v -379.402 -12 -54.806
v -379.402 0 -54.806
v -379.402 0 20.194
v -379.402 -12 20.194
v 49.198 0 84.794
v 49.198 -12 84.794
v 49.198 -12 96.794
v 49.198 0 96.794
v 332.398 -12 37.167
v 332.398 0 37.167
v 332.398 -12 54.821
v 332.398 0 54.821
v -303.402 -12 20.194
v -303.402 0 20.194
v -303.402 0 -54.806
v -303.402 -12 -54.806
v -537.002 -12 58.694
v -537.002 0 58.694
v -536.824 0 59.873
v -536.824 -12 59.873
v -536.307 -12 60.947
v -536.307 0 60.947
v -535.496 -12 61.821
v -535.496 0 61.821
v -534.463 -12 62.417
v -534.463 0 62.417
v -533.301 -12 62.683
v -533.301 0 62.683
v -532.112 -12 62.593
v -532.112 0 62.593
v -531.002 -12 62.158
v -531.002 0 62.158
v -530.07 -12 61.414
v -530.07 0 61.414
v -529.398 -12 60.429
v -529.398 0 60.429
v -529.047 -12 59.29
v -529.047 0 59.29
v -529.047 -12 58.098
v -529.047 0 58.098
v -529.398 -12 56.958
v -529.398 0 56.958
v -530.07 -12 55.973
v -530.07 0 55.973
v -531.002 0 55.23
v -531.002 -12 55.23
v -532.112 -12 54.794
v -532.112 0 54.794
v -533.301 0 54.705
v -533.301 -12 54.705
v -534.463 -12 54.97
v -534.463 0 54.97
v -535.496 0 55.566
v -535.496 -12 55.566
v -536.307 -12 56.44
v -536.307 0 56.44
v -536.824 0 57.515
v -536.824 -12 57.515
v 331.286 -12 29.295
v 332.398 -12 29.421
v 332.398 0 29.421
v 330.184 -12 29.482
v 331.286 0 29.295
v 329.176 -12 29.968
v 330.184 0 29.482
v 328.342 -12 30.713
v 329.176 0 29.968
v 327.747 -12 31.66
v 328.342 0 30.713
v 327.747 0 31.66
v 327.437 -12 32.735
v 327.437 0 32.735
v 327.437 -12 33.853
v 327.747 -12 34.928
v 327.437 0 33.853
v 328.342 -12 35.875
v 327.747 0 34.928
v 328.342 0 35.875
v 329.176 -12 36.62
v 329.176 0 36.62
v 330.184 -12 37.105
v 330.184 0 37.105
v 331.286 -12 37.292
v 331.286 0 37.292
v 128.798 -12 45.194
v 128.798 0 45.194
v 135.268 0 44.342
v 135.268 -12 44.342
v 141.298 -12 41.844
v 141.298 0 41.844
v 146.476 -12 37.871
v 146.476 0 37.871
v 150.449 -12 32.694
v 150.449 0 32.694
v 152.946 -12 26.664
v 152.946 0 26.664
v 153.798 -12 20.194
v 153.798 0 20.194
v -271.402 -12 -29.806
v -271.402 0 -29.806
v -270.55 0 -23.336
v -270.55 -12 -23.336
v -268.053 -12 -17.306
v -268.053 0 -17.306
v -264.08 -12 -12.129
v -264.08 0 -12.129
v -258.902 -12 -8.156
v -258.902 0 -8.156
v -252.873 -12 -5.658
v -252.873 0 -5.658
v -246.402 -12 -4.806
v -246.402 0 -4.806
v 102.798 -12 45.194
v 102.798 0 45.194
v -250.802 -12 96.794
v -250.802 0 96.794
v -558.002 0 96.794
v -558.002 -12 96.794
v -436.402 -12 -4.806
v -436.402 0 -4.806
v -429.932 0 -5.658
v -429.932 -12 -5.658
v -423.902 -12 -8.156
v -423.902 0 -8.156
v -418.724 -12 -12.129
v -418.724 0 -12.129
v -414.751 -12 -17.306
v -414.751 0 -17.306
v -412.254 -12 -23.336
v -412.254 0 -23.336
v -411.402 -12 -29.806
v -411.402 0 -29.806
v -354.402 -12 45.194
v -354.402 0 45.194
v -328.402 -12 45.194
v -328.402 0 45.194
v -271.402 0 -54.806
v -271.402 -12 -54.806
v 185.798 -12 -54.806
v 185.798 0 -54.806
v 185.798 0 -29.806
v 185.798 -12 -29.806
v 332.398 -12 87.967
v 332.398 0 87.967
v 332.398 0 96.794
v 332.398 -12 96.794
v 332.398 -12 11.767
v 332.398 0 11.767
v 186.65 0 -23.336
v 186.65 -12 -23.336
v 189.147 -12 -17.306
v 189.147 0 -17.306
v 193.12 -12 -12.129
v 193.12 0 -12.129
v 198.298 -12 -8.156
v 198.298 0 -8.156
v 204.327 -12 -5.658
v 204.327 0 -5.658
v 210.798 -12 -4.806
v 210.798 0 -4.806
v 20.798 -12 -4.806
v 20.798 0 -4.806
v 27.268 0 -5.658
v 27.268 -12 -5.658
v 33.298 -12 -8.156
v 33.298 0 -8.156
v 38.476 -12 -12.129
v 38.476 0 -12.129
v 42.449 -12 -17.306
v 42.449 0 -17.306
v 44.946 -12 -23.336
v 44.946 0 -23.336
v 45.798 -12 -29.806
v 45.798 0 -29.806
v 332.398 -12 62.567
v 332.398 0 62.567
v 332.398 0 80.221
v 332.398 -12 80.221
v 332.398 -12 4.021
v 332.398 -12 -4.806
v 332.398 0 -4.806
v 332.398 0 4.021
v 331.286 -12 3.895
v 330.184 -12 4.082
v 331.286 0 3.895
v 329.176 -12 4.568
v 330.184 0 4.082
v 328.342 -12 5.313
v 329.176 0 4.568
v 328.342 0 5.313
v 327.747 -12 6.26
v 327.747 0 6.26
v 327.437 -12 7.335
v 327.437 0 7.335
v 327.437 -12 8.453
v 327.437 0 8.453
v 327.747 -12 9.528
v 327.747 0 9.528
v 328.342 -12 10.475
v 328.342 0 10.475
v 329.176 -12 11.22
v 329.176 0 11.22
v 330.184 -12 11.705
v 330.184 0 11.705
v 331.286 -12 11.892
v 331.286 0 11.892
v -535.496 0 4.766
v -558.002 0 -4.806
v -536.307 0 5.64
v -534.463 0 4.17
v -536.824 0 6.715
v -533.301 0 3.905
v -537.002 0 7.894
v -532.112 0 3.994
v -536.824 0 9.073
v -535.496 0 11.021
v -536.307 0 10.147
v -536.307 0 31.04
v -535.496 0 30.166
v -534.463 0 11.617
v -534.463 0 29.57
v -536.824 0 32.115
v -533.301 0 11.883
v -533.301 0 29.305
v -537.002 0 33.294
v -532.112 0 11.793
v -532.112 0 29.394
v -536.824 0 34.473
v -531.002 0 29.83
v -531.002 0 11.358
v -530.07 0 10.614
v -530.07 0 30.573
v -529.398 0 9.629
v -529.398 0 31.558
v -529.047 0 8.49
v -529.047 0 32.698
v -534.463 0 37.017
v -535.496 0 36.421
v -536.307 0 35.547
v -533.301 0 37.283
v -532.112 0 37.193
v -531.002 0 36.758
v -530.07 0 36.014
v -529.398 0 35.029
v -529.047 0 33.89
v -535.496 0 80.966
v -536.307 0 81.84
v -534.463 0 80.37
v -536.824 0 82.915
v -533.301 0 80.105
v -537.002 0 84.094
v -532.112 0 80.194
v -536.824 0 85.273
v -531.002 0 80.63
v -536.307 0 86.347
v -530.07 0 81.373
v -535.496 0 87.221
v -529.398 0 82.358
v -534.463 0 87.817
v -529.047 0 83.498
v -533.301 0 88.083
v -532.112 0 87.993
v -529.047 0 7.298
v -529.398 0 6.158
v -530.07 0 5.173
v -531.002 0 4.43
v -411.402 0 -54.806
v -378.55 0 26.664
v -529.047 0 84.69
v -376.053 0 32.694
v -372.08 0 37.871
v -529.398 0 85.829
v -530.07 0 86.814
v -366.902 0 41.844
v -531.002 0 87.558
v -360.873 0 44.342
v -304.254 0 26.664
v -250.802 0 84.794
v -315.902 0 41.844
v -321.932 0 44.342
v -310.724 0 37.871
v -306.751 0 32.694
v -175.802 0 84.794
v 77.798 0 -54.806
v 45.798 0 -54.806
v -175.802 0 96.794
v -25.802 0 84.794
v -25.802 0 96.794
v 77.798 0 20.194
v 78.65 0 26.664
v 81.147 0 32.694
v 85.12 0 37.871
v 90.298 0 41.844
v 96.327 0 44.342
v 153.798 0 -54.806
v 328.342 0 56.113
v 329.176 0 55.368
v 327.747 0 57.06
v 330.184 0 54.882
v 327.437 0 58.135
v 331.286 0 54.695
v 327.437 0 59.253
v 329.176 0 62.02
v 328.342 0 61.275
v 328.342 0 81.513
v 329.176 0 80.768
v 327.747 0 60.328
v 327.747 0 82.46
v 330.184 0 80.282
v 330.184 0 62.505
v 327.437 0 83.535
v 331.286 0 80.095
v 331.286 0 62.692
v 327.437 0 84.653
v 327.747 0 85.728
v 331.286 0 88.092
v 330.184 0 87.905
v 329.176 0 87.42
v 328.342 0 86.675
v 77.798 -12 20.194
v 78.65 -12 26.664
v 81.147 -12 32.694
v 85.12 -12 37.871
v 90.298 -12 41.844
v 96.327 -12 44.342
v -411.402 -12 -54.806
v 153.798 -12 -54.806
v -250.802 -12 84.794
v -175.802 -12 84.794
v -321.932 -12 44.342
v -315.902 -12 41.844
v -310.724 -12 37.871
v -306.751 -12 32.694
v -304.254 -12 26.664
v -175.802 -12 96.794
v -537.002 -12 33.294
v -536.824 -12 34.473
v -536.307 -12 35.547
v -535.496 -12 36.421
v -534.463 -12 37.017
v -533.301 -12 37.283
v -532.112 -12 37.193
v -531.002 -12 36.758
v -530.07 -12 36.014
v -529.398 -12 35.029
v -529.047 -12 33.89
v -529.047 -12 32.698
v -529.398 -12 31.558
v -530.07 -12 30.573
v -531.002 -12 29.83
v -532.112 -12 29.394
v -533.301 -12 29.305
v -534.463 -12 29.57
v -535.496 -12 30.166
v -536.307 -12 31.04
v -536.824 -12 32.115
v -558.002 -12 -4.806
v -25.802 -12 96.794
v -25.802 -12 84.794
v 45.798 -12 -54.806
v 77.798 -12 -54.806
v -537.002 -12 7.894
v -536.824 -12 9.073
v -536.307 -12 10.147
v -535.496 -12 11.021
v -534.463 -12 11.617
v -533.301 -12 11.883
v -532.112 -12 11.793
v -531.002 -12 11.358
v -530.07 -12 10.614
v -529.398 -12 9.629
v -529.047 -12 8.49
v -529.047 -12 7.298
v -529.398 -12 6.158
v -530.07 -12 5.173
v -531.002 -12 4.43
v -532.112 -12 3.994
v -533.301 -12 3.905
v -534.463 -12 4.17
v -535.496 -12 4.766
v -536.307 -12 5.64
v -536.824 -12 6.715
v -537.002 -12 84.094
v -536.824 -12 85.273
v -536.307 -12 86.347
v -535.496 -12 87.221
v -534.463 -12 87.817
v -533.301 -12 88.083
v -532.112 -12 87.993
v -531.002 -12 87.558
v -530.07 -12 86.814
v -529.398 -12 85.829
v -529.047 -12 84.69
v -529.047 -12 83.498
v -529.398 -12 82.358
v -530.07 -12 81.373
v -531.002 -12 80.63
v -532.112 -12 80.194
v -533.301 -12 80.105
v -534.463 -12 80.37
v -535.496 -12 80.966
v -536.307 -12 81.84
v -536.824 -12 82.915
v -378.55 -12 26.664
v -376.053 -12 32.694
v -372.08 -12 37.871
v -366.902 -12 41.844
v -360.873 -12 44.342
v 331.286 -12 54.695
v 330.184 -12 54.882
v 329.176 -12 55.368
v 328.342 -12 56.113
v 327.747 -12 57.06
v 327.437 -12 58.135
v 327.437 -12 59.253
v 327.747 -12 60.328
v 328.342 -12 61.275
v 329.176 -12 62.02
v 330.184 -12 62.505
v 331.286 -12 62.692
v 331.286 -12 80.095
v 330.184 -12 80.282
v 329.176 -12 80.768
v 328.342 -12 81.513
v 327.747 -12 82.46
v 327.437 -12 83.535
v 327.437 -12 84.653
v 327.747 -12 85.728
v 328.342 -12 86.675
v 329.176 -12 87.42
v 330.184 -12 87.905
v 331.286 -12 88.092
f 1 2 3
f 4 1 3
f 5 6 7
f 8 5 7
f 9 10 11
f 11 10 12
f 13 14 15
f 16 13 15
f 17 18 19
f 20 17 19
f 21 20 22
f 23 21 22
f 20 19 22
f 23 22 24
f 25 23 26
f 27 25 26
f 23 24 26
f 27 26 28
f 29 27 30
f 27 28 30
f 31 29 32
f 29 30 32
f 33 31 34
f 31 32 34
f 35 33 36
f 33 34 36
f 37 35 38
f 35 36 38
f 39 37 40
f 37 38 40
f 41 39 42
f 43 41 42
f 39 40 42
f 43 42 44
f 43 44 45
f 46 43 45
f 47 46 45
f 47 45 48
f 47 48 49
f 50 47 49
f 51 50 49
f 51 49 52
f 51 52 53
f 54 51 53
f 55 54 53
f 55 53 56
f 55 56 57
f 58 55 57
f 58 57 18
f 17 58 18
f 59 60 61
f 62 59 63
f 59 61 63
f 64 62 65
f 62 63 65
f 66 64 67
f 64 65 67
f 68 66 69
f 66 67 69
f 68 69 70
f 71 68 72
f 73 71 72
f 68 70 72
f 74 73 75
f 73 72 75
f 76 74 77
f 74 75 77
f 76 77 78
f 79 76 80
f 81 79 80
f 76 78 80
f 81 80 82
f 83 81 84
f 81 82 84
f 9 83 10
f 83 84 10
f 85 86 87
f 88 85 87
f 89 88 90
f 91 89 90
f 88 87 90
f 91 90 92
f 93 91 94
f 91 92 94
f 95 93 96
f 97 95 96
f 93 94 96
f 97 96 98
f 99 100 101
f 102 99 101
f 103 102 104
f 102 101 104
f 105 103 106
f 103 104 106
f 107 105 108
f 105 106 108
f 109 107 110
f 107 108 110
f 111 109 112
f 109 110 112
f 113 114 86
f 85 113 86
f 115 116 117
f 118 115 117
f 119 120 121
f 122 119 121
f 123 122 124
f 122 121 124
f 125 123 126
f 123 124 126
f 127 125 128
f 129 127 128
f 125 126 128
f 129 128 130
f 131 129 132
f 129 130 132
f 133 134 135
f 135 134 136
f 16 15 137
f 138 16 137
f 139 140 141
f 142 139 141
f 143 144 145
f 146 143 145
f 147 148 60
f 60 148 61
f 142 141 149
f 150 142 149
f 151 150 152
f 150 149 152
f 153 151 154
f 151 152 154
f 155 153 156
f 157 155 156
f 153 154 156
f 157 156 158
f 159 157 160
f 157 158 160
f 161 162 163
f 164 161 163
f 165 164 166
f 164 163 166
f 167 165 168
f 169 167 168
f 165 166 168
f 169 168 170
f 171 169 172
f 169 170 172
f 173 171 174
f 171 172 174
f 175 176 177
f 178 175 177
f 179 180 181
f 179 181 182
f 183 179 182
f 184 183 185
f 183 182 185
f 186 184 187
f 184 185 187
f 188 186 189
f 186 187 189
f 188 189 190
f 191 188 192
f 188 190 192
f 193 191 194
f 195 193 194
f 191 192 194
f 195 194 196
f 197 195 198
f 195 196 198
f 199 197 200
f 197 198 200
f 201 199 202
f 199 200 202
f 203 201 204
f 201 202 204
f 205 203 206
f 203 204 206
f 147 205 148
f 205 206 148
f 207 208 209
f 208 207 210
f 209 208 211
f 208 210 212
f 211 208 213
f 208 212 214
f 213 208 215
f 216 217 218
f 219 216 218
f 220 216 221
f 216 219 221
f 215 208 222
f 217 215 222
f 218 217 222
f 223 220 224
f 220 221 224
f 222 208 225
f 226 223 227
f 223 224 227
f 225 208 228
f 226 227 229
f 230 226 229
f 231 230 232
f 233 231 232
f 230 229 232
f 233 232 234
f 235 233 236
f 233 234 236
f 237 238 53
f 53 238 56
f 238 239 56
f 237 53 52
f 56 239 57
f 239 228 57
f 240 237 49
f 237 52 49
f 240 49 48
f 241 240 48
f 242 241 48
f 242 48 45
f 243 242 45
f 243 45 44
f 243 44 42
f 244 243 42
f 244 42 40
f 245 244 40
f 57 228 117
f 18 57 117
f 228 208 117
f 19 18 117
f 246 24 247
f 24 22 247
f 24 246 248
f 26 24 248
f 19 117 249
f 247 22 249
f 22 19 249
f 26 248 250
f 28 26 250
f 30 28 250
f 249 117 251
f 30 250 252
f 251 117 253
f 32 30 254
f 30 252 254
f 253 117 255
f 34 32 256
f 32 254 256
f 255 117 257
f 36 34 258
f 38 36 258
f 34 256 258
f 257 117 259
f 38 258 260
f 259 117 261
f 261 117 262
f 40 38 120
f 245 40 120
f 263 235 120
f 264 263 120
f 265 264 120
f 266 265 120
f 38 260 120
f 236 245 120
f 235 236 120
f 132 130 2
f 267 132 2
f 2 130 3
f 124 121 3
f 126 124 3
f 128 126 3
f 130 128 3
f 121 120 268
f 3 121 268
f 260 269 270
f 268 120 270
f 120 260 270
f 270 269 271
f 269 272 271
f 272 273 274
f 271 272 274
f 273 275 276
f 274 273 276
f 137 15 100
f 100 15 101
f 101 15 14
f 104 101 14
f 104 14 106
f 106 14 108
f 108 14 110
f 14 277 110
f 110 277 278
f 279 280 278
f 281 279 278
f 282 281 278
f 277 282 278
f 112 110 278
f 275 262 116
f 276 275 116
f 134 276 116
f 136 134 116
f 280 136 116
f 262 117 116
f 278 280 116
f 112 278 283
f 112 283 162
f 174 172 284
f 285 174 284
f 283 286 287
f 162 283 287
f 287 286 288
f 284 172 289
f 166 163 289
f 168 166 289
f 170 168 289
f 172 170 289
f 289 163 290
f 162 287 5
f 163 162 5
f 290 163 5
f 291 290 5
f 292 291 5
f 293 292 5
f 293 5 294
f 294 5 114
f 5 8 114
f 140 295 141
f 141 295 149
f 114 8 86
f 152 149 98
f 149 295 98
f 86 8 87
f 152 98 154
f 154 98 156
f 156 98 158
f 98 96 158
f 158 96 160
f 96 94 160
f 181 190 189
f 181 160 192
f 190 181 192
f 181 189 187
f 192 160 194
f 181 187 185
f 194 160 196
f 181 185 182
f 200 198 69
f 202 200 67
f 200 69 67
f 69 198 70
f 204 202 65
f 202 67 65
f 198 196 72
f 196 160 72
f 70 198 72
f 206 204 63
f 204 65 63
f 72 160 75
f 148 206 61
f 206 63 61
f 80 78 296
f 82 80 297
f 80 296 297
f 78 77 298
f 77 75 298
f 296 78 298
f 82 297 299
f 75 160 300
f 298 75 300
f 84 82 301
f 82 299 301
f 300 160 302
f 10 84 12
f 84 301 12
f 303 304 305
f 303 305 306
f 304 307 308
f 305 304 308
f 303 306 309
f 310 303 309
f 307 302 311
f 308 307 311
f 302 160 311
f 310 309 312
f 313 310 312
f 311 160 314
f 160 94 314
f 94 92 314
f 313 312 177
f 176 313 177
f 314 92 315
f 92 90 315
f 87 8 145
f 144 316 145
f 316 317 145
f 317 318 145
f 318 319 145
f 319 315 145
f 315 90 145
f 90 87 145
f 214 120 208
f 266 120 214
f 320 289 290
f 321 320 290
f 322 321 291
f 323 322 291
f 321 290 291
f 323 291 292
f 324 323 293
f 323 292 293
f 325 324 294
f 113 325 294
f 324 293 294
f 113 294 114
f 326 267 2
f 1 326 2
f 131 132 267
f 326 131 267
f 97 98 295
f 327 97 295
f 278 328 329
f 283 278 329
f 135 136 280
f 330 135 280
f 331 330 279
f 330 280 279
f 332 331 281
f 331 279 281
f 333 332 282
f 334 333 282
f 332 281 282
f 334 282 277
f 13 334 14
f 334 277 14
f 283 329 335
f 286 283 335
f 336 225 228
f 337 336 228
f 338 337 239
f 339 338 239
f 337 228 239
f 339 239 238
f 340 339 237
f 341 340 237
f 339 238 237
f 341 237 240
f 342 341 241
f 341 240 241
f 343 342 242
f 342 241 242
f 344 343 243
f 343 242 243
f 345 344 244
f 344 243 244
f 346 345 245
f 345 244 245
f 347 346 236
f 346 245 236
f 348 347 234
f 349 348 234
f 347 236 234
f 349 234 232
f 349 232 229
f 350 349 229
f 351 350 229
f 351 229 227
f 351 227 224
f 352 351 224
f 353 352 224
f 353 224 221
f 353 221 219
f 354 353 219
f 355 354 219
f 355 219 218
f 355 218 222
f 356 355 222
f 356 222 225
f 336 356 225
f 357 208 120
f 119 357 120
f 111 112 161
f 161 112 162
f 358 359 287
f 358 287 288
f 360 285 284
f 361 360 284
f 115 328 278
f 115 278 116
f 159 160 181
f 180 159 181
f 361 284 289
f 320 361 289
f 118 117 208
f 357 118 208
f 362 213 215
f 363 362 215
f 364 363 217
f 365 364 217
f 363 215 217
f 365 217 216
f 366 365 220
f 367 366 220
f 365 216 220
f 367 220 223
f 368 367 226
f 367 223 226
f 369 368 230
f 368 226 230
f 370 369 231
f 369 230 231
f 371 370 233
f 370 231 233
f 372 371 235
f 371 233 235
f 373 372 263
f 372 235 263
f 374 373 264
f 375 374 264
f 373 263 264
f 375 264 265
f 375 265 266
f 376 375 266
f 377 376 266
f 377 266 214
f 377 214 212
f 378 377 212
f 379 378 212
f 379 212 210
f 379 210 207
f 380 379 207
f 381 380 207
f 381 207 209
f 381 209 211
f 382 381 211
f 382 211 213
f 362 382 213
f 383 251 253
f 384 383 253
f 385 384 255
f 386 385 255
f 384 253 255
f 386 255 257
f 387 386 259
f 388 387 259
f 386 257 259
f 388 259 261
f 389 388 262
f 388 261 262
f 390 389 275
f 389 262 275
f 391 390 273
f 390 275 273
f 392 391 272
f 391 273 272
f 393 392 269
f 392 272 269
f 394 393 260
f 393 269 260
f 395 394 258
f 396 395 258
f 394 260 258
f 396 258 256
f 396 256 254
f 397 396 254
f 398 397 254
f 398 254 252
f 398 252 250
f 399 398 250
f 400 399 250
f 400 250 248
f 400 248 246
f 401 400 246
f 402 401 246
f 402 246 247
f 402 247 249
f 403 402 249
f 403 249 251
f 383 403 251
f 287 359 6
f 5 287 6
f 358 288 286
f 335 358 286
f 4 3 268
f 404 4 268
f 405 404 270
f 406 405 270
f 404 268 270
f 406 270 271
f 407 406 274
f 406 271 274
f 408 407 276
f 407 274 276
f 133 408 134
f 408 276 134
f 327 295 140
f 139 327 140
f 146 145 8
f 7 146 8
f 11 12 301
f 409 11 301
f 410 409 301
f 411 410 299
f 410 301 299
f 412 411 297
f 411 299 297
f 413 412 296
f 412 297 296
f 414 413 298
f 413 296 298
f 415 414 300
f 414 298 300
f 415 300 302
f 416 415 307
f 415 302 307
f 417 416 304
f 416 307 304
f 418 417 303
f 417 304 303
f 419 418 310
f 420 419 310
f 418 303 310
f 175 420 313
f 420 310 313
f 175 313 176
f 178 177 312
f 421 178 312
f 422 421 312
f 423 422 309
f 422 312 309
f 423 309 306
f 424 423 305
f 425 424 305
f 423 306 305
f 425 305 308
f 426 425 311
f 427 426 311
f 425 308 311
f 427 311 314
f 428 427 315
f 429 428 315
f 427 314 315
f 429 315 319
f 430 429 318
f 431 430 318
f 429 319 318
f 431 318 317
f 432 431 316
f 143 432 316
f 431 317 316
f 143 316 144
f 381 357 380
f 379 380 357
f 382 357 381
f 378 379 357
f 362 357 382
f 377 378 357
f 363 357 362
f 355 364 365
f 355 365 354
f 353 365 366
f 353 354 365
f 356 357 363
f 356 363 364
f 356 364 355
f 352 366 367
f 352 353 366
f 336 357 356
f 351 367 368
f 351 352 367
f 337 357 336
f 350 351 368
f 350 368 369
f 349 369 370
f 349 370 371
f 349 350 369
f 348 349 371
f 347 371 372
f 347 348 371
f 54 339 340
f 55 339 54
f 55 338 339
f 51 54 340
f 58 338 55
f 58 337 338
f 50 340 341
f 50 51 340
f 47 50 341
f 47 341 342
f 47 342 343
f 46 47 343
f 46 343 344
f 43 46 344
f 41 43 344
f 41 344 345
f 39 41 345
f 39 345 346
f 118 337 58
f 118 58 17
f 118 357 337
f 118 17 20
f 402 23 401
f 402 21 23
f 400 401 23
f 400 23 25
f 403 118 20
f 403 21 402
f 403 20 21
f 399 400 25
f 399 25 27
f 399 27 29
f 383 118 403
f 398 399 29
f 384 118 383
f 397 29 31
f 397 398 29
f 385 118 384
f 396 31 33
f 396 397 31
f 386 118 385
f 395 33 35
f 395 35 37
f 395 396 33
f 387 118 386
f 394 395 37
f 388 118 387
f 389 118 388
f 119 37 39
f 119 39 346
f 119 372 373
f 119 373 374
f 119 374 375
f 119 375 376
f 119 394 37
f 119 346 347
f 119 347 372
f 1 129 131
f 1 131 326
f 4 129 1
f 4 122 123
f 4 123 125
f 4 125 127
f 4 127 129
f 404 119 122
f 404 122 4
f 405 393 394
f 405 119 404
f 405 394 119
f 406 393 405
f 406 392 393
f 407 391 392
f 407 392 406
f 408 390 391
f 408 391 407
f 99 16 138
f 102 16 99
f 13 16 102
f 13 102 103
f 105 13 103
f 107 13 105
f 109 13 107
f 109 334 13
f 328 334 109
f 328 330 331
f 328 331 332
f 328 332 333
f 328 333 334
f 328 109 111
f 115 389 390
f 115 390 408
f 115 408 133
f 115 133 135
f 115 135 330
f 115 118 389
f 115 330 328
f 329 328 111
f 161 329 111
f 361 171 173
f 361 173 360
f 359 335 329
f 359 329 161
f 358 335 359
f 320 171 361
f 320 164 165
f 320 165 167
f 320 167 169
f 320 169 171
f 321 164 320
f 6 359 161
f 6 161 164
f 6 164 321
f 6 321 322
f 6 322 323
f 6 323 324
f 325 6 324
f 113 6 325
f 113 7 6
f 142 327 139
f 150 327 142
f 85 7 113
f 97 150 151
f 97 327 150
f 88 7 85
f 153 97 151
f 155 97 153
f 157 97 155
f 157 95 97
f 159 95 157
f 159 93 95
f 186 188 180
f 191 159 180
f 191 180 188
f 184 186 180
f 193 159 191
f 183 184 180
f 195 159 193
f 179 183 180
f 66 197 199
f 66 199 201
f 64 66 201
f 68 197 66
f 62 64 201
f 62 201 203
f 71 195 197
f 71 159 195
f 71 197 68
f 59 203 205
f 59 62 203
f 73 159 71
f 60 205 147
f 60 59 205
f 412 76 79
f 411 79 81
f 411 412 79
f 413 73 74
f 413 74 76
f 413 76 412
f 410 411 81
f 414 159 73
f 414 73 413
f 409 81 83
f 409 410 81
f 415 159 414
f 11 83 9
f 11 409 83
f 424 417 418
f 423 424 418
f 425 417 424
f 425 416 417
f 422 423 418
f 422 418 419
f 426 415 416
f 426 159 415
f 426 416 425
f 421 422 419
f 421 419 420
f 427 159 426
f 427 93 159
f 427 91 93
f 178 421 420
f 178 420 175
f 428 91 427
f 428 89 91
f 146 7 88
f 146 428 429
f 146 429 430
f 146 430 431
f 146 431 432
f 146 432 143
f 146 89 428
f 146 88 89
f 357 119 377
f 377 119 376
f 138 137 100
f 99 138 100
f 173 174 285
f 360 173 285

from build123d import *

# Parameters (mm, degrees)
F1_DEPTH = 12
F3_D     = 8
F4_W     = 75
F4_H     = 12
F5_DEPTH = 25


with BuildPart() as f1:
    # F0 (on Front) → F1 (new body)
    with BuildSketch(Plane.XZ):
        with BuildLine():
            Line((332.3978893597, 96.7937542379), (-558.0021106403, 96.7937542379))
            Line((-558.0021106403, 96.7937542379), (-558.0021106403, -4.8062457621))
            Line((-558.0021106403, -4.8062457621), (-436.4021106403, -4.8062457621))
            ThreePointArc((-436.4021106403, -4.8062457621), (-418.7244411107, -12.1285762324), (-411.4021106403, -29.8062457621))
            Line((-411.4021106403, -29.8062457621), (-411.4021106403, -54.8062457621))
            Line((-411.4021106403, -54.8062457621), (-379.4021106403, -54.8062457621))
            Line((-379.4021106403, -54.8062457621), (-379.4021106403, 20.1937542379))
            ThreePointArc((-379.4021106403, 20.1937542379), (-372.07978017, 37.8714237676), (-354.4021106403, 45.1937542379))
            Line((-354.4021106403, 45.1937542379), (-328.4021106403, 45.1937542379))
            ThreePointArc((-328.4021106403, 45.1937542379), (-310.7244411107, 37.8714237676), (-303.4021106403, 20.1937542379))
            Line((-303.4021106403, 20.1937542379), (-303.4021106403, -54.8062457621))
            Line((-303.4021106403, -54.8062457621), (-271.4021106403, -54.8062457621))
            Line((-271.4021106403, -54.8062457621), (-271.4021106403, -29.8062457621))
            ThreePointArc((-271.4021106403, -29.8062457621), (-264.07978017, -12.1285762324), (-246.4021106403, -4.8062457621))
            Line((-246.4021106403, -4.8062457621), (20.7978893597, -4.8062457621))
            ThreePointArc((20.7978893597, -4.8062457621), (38.4755588893, -12.1285762324), (45.7978893597, -29.8062457621))
            Line((45.7978893597, -29.8062457621), (45.7978893597, -54.8062457621))
            Line((45.7978893597, -54.8062457621), (77.7978893597, -54.8062457621))
            Line((77.7978893597, -54.8062457621), (77.7978893597, 20.1937542379))
            ThreePointArc((77.7978893597, 20.1937542379), (85.12021983, 37.8714237676), (102.7978893597, 45.1937542379))
            Line((102.7978893597, 45.1937542379), (128.7978893597, 45.1937542379))
            ThreePointArc((128.7978893597, 45.1937542379), (146.4755588893, 37.8714237676), (153.7978893597, 20.1937542379))
            Line((153.7978893597, 20.1937542379), (153.7978893597, -54.8062457621))
            Line((153.7978893597, -54.8062457621), (185.7978893597, -54.8062457621))
            Line((185.7978893597, -54.8062457621), (185.7978893597, -29.8062457621))
            ThreePointArc((185.7978893597, -29.8062457621), (193.12021983, -12.1285762324), (210.7978893597, -4.8062457621))
            Line((210.7978893597, -4.8062457621), (332.3978893597, -4.8062457621))
            Line((332.3978893597, -4.8062457621), (332.3978893597, 96.7937542379))
        make_face()
    extrude(amount=F1_DEPTH)

    # F3 (through all)
    with Locations(Plane.XZ.offset(12)):
        with Locations((-533.0021106403, 84.0937542379), (-533.0021106403, 58.6937542379), (-533.0021106403, 33.2937542379), (-533.0021106403, 7.8937542379), (331.3978893597, 84.0937542379), (331.3978893597, 58.6937542379), (331.3978893597, 33.2937542379), (331.3978893597, 7.8937542379)):
            Hole(F3_D / 2)

    # F4 (on face) → F5 (cut)
    with BuildSketch(Plane.XZ.offset(12)):
        with Locations((-213.3021106403, 90.7937542379)):
            Rectangle(F4_W, F4_H)
        with Locations((11.6978893597, 90.7937542379)):
            Rectangle(F4_W, F4_H)
    extrude(amount=-F5_DEPTH, mode=Mode.SUBTRACT)


solid = f1.part
